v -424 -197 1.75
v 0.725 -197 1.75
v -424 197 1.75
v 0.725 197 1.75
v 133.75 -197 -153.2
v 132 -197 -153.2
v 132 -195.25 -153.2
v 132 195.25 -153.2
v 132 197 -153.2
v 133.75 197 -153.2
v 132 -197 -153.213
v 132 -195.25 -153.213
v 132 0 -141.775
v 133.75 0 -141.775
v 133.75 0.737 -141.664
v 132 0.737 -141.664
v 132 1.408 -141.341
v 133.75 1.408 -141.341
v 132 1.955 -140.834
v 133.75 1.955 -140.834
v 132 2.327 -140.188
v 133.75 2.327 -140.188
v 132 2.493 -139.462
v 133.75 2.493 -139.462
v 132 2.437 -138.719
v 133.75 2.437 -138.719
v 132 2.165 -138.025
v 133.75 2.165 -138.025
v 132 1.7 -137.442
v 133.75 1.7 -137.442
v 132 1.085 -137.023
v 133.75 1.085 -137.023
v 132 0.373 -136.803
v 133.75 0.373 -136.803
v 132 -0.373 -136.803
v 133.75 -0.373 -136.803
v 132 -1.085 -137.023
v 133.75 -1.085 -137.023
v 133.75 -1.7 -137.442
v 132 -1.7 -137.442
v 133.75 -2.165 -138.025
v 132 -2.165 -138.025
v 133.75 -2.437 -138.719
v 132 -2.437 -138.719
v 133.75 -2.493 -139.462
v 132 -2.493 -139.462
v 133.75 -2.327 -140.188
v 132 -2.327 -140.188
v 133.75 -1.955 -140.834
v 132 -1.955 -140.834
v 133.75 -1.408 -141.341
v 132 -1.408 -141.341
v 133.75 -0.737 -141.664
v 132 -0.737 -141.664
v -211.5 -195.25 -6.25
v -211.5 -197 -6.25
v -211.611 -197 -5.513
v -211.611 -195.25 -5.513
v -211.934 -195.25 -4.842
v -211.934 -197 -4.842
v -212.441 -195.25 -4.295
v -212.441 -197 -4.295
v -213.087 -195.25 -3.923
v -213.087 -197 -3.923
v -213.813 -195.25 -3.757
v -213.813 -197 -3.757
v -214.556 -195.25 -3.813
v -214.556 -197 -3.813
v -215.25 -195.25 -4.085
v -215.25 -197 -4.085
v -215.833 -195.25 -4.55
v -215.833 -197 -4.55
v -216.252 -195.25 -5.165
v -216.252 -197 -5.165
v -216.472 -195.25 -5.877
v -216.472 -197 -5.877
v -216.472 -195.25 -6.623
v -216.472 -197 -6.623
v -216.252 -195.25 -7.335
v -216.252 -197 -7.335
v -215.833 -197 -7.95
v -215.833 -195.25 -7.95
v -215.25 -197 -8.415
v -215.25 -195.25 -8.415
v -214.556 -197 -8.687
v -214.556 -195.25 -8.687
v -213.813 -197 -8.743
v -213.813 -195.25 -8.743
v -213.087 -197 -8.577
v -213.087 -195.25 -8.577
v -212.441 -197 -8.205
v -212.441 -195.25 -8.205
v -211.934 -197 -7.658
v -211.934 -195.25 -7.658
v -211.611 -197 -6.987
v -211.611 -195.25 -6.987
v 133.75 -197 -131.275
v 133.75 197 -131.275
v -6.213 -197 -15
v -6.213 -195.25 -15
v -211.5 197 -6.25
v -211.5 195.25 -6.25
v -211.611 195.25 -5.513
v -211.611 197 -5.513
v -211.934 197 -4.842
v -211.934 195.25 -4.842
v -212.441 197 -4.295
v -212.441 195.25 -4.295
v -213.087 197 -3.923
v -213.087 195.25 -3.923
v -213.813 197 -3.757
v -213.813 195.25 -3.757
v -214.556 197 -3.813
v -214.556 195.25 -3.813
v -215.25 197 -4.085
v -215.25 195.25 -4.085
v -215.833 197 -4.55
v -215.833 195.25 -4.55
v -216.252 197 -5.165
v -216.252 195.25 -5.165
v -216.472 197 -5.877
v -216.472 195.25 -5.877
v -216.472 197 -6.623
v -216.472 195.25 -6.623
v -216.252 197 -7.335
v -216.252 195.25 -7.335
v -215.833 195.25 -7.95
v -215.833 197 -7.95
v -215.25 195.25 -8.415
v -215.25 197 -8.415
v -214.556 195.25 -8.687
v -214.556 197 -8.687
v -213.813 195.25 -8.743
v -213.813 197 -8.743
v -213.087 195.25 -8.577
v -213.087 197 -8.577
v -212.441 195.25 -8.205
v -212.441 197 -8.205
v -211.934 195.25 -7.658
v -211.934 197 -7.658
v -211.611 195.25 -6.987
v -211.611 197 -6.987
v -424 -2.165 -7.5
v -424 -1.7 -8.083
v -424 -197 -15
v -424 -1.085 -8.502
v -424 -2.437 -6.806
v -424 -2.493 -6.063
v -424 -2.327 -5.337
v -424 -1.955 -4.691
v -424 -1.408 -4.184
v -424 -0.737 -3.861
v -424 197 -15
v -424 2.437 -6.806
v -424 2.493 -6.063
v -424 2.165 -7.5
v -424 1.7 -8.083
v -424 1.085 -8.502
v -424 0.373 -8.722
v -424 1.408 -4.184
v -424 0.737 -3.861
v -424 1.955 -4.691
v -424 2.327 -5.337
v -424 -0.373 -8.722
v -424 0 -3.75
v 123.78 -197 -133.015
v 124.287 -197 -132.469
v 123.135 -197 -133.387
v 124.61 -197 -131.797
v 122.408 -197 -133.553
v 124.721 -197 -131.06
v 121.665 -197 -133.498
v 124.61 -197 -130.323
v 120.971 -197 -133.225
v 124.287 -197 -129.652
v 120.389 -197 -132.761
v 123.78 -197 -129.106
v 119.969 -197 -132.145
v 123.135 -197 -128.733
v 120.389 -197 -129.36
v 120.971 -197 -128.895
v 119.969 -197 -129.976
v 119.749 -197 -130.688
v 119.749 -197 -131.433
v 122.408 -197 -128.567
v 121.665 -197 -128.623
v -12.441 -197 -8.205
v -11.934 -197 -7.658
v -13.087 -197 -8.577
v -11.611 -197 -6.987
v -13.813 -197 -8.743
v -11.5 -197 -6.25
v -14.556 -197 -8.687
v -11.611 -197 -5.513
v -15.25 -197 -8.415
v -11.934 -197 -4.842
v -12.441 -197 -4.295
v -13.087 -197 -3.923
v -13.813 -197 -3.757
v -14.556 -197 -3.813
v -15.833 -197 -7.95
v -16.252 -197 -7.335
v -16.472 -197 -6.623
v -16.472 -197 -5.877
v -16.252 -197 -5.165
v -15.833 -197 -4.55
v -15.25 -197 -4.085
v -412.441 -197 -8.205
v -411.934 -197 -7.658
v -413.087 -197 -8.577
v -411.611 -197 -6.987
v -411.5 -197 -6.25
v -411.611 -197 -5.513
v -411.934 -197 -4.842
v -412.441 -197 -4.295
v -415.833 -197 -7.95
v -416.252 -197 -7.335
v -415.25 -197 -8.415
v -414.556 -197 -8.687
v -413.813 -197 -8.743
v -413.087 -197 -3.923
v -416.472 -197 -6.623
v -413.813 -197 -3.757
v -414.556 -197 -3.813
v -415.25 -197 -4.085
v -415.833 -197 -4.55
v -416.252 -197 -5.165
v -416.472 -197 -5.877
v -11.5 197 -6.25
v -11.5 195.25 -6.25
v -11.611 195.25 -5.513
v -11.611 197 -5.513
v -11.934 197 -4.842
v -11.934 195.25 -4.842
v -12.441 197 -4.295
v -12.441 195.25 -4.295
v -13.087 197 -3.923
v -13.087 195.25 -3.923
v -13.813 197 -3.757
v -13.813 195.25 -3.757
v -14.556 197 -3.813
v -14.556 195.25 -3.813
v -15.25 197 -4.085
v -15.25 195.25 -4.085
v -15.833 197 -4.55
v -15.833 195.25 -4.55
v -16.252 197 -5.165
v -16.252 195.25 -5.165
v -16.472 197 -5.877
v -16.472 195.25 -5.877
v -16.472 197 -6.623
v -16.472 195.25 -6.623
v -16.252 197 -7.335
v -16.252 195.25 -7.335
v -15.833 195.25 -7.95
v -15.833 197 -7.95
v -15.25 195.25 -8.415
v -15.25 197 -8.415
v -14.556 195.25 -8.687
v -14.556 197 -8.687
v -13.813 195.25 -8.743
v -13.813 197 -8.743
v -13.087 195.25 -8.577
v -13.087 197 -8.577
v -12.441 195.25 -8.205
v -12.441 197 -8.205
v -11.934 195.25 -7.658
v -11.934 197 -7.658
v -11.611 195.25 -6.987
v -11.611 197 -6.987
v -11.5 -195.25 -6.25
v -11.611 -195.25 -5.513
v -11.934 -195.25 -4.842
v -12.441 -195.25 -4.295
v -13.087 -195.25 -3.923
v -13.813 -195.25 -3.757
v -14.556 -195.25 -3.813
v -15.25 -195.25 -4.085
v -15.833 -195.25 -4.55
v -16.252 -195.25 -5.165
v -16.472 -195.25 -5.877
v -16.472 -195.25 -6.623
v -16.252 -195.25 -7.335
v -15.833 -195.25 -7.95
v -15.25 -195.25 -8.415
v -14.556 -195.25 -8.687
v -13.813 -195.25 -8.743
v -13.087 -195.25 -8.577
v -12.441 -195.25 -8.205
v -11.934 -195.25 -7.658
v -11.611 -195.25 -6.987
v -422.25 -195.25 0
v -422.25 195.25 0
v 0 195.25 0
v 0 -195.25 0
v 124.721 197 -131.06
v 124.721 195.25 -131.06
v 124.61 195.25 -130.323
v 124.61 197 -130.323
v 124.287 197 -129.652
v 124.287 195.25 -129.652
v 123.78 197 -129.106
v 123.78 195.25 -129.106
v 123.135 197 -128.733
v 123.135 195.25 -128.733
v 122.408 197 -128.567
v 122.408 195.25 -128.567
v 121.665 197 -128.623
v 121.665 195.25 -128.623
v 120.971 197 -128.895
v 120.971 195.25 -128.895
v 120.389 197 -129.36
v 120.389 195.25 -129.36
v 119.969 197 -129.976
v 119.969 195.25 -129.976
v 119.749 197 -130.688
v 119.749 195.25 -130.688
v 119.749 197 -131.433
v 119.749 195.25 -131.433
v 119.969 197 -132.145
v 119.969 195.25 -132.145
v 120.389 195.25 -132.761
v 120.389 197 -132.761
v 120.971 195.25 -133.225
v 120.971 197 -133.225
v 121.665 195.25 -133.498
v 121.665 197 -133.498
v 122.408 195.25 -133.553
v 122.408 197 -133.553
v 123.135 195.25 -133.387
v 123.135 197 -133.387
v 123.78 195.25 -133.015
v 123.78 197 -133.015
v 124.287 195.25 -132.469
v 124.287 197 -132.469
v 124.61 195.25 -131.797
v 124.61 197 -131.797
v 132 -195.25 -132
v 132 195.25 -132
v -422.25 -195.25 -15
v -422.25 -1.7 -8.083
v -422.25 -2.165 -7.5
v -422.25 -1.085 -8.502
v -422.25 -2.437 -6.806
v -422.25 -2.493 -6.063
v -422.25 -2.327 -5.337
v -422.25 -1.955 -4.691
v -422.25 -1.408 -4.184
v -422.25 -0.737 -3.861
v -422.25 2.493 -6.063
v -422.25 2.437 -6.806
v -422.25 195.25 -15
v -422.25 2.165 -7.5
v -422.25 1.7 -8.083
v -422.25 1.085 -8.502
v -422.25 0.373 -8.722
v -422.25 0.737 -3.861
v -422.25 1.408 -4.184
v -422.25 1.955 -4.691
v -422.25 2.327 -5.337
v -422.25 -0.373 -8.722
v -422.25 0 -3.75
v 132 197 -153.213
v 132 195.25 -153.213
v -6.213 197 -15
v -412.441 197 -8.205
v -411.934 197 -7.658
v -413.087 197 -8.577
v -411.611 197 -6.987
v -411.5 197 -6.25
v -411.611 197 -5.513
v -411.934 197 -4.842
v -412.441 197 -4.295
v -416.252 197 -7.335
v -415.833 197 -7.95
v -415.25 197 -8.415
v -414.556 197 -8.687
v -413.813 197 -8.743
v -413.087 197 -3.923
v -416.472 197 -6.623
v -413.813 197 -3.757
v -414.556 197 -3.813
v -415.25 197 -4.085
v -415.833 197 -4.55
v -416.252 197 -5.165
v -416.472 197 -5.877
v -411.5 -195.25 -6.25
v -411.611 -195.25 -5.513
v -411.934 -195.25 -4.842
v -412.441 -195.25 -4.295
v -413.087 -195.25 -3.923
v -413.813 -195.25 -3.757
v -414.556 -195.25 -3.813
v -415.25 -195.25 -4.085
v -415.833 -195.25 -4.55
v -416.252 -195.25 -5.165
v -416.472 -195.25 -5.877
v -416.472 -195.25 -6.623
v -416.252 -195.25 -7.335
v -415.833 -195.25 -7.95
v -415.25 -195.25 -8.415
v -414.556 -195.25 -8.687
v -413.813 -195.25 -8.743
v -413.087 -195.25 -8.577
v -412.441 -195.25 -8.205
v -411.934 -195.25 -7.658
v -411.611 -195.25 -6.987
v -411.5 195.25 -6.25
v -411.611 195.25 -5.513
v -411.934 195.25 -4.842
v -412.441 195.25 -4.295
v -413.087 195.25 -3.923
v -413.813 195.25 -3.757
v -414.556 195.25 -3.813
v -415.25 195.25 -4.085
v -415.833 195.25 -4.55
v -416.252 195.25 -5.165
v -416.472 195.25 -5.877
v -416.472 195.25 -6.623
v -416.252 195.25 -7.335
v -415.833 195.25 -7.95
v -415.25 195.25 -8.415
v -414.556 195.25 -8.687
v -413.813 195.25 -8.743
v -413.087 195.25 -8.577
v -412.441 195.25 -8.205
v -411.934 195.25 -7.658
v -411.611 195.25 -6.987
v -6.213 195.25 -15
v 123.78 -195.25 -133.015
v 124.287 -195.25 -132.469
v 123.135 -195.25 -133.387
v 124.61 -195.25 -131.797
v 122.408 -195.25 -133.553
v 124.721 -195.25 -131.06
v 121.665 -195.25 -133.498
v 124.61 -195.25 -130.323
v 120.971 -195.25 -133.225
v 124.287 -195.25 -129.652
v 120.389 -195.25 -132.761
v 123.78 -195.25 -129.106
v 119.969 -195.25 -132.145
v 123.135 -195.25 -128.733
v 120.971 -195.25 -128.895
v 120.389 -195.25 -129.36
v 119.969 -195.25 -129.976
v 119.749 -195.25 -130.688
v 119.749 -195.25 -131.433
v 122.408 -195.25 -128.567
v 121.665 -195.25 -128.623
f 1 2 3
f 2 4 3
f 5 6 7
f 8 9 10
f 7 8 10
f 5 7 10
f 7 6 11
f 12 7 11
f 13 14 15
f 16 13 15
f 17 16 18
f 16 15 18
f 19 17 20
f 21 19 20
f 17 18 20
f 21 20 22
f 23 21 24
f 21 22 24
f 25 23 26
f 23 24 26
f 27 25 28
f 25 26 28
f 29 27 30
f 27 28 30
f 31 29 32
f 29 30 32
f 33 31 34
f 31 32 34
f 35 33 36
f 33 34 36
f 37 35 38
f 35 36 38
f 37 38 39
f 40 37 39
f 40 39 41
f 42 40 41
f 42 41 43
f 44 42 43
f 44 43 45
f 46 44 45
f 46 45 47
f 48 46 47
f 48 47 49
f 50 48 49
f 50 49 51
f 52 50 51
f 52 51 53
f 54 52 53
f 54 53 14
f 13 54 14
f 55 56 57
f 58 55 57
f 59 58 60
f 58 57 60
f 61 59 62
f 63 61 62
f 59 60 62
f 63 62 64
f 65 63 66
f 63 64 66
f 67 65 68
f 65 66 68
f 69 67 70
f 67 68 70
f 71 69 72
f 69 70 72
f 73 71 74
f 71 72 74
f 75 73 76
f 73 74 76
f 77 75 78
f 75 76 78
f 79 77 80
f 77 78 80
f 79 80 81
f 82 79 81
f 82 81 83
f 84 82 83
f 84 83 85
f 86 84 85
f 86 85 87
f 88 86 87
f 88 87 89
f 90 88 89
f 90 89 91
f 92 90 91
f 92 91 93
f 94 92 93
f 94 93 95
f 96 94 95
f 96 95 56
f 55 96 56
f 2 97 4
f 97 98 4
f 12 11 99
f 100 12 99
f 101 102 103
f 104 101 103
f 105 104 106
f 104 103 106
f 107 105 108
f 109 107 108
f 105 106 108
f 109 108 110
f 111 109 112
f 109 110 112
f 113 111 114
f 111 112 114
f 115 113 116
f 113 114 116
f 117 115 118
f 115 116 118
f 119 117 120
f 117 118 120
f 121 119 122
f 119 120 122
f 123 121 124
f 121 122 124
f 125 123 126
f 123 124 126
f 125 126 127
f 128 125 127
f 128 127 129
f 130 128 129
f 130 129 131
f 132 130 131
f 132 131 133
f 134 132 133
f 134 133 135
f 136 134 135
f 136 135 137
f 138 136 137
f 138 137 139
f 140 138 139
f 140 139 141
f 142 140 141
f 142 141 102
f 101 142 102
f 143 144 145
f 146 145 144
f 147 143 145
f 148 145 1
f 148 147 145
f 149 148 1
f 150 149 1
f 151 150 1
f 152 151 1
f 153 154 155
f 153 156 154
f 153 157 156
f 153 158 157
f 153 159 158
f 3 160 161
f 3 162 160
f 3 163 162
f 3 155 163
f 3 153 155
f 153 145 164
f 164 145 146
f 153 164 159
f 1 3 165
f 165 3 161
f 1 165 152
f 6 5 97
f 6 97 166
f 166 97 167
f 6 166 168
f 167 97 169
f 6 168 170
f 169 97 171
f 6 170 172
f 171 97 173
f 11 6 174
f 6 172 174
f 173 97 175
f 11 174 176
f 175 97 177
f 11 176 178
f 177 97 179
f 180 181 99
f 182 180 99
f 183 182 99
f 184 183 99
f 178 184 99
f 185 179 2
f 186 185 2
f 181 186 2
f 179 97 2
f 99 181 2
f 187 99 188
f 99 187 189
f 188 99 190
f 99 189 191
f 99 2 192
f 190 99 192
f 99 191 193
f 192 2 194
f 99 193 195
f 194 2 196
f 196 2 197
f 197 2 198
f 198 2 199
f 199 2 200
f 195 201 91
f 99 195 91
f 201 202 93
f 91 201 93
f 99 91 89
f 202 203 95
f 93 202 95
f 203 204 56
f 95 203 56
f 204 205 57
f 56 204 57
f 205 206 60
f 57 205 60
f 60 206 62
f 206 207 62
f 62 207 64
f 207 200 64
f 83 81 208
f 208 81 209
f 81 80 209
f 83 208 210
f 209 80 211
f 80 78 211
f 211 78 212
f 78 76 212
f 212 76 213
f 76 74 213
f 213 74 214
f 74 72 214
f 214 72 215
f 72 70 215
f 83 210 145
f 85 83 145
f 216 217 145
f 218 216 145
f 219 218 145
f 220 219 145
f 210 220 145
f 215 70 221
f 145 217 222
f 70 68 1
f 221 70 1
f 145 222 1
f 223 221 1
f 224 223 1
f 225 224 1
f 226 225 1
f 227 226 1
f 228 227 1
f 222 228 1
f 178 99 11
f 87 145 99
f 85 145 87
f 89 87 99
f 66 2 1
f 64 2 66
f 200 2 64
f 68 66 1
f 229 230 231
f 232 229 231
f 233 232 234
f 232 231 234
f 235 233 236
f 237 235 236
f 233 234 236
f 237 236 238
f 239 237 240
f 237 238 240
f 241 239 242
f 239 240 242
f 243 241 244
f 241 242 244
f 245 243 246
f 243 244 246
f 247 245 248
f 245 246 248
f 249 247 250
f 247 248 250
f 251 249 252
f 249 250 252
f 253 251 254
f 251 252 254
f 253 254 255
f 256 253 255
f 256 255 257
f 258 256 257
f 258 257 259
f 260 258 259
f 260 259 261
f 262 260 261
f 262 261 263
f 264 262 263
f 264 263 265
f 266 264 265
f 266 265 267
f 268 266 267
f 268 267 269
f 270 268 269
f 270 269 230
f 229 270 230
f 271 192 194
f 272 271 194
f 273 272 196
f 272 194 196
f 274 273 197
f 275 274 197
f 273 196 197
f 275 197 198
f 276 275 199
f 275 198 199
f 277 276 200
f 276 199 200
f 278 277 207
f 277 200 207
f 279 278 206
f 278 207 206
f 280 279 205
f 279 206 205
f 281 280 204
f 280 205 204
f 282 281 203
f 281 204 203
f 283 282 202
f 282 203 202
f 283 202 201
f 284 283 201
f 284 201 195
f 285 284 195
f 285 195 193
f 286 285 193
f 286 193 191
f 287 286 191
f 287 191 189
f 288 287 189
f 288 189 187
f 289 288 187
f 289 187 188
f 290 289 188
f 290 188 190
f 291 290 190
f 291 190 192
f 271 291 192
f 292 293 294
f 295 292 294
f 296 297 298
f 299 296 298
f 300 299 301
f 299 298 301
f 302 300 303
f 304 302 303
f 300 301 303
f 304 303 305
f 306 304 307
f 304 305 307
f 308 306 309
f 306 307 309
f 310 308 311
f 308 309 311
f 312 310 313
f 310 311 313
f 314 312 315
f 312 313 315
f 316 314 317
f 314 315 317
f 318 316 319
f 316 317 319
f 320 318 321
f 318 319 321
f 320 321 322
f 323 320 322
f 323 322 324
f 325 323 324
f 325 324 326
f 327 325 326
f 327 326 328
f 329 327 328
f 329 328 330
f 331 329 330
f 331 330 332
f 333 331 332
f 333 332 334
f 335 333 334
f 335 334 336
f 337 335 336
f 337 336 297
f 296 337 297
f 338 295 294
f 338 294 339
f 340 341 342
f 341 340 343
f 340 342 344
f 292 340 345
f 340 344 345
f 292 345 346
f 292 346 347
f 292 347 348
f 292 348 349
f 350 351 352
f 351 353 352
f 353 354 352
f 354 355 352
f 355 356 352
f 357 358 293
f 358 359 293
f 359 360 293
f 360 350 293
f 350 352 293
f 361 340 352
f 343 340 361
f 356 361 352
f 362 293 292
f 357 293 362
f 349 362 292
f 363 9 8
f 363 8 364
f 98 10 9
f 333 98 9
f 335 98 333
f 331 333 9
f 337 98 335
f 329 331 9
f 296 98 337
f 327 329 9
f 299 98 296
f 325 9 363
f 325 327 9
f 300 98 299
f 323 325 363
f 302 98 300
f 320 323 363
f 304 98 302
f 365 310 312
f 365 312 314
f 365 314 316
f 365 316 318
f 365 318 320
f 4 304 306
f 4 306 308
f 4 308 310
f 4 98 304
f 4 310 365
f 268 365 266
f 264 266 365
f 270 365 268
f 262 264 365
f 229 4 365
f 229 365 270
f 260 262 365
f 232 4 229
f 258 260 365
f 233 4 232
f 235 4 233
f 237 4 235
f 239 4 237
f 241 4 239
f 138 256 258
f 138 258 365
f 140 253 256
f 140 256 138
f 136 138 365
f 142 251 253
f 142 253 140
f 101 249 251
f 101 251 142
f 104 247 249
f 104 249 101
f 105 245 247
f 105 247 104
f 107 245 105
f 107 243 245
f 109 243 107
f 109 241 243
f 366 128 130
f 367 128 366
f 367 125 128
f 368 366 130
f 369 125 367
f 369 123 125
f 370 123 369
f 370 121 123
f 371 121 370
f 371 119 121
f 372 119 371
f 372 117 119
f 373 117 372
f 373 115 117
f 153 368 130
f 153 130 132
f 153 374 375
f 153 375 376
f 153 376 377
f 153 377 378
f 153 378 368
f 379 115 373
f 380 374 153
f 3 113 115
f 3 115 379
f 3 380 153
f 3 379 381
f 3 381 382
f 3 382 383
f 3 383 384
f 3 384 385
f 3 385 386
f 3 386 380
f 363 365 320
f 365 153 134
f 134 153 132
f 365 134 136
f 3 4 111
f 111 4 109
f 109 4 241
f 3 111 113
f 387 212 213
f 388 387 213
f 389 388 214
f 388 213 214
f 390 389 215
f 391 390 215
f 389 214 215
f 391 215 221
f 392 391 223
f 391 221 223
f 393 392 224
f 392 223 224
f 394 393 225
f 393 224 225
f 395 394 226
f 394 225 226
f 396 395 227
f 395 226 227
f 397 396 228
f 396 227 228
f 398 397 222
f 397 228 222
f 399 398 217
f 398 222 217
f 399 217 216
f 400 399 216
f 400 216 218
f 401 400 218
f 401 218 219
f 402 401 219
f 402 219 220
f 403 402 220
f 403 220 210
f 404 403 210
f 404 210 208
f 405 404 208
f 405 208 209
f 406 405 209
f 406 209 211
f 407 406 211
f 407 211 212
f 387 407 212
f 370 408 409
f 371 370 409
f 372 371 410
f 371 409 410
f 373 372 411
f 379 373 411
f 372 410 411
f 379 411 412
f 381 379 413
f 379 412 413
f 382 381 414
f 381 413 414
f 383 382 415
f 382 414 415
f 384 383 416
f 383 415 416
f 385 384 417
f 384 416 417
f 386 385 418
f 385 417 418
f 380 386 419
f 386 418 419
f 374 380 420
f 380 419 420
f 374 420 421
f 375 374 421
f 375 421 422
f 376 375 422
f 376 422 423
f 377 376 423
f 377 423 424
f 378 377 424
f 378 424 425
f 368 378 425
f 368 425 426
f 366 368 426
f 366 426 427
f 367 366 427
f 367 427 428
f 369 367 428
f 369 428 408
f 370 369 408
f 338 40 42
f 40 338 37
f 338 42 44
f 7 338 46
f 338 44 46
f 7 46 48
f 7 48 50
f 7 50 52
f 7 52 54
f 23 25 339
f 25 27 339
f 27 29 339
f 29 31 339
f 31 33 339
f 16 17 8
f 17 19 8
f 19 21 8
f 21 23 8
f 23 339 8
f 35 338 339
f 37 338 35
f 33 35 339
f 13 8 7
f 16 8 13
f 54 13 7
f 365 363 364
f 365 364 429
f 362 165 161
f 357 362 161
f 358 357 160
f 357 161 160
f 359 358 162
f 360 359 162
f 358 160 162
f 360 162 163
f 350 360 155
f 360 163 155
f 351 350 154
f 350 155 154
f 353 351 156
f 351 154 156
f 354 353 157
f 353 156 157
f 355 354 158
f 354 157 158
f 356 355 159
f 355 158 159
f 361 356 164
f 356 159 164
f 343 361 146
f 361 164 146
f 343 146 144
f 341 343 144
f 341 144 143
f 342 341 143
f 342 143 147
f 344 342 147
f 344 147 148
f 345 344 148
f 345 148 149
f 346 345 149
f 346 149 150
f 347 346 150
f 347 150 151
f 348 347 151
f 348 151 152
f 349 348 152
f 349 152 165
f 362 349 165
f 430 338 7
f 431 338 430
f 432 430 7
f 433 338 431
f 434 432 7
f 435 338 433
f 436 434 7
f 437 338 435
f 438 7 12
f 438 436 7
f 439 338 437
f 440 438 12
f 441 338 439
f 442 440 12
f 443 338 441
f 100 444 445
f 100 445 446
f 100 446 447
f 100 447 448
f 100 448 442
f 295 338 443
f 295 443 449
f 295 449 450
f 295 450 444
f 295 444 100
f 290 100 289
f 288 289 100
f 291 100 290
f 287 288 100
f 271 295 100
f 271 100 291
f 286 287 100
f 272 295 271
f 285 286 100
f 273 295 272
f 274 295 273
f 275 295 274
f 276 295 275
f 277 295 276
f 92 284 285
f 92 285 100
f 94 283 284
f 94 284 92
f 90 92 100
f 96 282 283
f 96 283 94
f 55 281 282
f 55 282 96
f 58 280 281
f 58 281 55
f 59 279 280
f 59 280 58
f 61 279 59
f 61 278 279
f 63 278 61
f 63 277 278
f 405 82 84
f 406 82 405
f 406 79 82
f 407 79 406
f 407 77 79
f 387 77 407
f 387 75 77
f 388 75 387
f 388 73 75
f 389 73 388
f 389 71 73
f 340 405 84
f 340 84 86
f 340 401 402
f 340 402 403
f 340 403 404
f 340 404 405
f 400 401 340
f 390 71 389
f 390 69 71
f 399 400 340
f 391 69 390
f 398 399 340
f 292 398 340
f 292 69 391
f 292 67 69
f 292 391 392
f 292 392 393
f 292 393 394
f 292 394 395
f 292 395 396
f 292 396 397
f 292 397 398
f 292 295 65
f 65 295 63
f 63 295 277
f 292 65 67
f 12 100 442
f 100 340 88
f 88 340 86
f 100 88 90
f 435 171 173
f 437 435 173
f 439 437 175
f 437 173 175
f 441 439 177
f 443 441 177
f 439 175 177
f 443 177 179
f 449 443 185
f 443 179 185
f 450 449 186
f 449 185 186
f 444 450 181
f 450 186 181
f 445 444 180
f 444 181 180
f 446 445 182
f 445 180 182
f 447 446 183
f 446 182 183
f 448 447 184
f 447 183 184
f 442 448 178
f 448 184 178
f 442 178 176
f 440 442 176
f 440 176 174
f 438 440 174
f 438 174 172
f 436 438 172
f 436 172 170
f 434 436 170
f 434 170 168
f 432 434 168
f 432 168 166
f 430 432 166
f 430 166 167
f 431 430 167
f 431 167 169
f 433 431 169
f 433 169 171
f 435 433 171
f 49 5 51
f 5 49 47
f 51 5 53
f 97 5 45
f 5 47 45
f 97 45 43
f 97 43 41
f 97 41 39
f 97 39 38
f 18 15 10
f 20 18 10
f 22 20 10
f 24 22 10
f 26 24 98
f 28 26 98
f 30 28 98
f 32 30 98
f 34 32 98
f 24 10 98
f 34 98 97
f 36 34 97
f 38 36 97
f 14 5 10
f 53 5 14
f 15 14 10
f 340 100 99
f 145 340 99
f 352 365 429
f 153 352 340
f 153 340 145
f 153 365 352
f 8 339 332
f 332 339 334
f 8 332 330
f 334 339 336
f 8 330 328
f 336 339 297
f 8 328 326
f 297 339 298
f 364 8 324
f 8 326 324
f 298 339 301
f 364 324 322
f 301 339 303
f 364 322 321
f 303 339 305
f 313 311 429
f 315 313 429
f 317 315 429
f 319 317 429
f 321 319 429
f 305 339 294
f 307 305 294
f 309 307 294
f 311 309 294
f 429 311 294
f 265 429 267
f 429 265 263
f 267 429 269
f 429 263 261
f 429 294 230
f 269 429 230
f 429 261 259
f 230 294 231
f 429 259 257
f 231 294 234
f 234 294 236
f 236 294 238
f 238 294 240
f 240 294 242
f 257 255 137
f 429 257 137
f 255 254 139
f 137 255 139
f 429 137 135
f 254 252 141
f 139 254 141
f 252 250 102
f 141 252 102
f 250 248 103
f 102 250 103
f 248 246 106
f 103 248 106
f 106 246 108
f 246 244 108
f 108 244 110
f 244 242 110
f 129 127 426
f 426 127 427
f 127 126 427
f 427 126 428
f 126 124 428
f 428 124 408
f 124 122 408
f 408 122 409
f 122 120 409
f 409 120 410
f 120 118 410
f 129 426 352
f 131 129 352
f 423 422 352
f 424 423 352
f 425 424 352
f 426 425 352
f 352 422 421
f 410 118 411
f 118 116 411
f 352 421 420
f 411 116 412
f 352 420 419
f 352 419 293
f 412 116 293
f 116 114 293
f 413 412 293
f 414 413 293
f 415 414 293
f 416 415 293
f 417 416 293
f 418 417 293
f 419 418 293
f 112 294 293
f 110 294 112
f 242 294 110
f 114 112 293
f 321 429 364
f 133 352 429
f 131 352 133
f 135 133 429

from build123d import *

# Parameters (mm, degrees)
DODANIE_WYCI_GNI_CIE1_DEPTH = 197
DODANIE_WYCI_GNI_CIE2_DEPTH = 1.75
SZKIC3_R                    = 2.5
WYTNIJ_WYCI_GNI_CIE1_DEPTH  = 466
SZKIC4_R                    = 2.5
WYTNIJ_WYCI_GNI_CIE2_DEPTH  = 5
SZKIC5_R                    = 2.5
WYTNIJ_WYCI_GNI_CIE3_DEPTH  = 5


with BuildPart() as part:
    # Szkic1 → Dodanie-wyciągnięcie1 (new body, symmetric)
    with BuildSketch(Plane(origin=(0, 0, 0), x_dir=(1, 0, 0), z_dir=(0, 1, 0))):
        Polygon((-422.25, 0), (0, 0), (132, 132), (132, 153.2), (133.75, 153.2), (133.75, 131.275126266), (0.724873734, -1.75), (-424, -1.75), (-424, 0), (-424, 15), (-422.25, 15), align=None)
    extrude(amount=DODANIE_WYCI_GNI_CIE1_DEPTH, both=True)

    # Szkic2 → Dodanie-wyciągnięcie2 (add)
    with BuildSketch(Plane.XZ.offset(197)):
        Polygon((-422.25, -15), (-422.25, 0), (0, 0), (132, -132), (132, -153.213203436), (-6.213203436, -15), align=None)
    dodanie_wyci_gni_cie2 = extrude(amount=-DODANIE_WYCI_GNI_CIE2_DEPTH)

    # Lustro1: Dodanie-wyciągnięcie2 across plane
    add(dodanie_wyci_gni_cie2.mirror(Plane.ZX))

    # Szkic3 → Wytnij-wyciągnięcie1 (cut)
    with BuildSketch(Plane.XZ.offset(197)):
        with Locations((-414, -6.25)):
            Circle(SZKIC3_R)
        with Locations((-214, -6.25)):
            Circle(SZKIC3_R)
        with Locations((-14, -6.25)):
            Circle(SZKIC3_R)
        with Locations((122.221470087, -131.060304852)):
            Circle(SZKIC3_R)
    extrude(amount=-WYTNIJ_WYCI_GNI_CIE1_DEPTH, mode=Mode.SUBTRACT)

    # Szkic4 → Wytnij-wyciągnięcie2 (cut)
    with BuildSketch(Plane(origin=(133.75, 0, 0), x_dir=(0, 0, -1), z_dir=(1, 0, 0))):
        with Locations((139.275126266, 0)):
            Circle(SZKIC4_R)
    extrude(amount=-WYTNIJ_WYCI_GNI_CIE2_DEPTH, mode=Mode.SUBTRACT)

    # Szkic5 → Wytnij-wyciągnięcie3 (cut)
    with BuildSketch(Plane.ZY.offset(424)):
        with Locations((-6.25, 0)):
            Circle(SZKIC5_R)
    extrude(amount=-WYTNIJ_WYCI_GNI_CIE3_DEPTH, mode=Mode.SUBTRACT)


solid = part.part
